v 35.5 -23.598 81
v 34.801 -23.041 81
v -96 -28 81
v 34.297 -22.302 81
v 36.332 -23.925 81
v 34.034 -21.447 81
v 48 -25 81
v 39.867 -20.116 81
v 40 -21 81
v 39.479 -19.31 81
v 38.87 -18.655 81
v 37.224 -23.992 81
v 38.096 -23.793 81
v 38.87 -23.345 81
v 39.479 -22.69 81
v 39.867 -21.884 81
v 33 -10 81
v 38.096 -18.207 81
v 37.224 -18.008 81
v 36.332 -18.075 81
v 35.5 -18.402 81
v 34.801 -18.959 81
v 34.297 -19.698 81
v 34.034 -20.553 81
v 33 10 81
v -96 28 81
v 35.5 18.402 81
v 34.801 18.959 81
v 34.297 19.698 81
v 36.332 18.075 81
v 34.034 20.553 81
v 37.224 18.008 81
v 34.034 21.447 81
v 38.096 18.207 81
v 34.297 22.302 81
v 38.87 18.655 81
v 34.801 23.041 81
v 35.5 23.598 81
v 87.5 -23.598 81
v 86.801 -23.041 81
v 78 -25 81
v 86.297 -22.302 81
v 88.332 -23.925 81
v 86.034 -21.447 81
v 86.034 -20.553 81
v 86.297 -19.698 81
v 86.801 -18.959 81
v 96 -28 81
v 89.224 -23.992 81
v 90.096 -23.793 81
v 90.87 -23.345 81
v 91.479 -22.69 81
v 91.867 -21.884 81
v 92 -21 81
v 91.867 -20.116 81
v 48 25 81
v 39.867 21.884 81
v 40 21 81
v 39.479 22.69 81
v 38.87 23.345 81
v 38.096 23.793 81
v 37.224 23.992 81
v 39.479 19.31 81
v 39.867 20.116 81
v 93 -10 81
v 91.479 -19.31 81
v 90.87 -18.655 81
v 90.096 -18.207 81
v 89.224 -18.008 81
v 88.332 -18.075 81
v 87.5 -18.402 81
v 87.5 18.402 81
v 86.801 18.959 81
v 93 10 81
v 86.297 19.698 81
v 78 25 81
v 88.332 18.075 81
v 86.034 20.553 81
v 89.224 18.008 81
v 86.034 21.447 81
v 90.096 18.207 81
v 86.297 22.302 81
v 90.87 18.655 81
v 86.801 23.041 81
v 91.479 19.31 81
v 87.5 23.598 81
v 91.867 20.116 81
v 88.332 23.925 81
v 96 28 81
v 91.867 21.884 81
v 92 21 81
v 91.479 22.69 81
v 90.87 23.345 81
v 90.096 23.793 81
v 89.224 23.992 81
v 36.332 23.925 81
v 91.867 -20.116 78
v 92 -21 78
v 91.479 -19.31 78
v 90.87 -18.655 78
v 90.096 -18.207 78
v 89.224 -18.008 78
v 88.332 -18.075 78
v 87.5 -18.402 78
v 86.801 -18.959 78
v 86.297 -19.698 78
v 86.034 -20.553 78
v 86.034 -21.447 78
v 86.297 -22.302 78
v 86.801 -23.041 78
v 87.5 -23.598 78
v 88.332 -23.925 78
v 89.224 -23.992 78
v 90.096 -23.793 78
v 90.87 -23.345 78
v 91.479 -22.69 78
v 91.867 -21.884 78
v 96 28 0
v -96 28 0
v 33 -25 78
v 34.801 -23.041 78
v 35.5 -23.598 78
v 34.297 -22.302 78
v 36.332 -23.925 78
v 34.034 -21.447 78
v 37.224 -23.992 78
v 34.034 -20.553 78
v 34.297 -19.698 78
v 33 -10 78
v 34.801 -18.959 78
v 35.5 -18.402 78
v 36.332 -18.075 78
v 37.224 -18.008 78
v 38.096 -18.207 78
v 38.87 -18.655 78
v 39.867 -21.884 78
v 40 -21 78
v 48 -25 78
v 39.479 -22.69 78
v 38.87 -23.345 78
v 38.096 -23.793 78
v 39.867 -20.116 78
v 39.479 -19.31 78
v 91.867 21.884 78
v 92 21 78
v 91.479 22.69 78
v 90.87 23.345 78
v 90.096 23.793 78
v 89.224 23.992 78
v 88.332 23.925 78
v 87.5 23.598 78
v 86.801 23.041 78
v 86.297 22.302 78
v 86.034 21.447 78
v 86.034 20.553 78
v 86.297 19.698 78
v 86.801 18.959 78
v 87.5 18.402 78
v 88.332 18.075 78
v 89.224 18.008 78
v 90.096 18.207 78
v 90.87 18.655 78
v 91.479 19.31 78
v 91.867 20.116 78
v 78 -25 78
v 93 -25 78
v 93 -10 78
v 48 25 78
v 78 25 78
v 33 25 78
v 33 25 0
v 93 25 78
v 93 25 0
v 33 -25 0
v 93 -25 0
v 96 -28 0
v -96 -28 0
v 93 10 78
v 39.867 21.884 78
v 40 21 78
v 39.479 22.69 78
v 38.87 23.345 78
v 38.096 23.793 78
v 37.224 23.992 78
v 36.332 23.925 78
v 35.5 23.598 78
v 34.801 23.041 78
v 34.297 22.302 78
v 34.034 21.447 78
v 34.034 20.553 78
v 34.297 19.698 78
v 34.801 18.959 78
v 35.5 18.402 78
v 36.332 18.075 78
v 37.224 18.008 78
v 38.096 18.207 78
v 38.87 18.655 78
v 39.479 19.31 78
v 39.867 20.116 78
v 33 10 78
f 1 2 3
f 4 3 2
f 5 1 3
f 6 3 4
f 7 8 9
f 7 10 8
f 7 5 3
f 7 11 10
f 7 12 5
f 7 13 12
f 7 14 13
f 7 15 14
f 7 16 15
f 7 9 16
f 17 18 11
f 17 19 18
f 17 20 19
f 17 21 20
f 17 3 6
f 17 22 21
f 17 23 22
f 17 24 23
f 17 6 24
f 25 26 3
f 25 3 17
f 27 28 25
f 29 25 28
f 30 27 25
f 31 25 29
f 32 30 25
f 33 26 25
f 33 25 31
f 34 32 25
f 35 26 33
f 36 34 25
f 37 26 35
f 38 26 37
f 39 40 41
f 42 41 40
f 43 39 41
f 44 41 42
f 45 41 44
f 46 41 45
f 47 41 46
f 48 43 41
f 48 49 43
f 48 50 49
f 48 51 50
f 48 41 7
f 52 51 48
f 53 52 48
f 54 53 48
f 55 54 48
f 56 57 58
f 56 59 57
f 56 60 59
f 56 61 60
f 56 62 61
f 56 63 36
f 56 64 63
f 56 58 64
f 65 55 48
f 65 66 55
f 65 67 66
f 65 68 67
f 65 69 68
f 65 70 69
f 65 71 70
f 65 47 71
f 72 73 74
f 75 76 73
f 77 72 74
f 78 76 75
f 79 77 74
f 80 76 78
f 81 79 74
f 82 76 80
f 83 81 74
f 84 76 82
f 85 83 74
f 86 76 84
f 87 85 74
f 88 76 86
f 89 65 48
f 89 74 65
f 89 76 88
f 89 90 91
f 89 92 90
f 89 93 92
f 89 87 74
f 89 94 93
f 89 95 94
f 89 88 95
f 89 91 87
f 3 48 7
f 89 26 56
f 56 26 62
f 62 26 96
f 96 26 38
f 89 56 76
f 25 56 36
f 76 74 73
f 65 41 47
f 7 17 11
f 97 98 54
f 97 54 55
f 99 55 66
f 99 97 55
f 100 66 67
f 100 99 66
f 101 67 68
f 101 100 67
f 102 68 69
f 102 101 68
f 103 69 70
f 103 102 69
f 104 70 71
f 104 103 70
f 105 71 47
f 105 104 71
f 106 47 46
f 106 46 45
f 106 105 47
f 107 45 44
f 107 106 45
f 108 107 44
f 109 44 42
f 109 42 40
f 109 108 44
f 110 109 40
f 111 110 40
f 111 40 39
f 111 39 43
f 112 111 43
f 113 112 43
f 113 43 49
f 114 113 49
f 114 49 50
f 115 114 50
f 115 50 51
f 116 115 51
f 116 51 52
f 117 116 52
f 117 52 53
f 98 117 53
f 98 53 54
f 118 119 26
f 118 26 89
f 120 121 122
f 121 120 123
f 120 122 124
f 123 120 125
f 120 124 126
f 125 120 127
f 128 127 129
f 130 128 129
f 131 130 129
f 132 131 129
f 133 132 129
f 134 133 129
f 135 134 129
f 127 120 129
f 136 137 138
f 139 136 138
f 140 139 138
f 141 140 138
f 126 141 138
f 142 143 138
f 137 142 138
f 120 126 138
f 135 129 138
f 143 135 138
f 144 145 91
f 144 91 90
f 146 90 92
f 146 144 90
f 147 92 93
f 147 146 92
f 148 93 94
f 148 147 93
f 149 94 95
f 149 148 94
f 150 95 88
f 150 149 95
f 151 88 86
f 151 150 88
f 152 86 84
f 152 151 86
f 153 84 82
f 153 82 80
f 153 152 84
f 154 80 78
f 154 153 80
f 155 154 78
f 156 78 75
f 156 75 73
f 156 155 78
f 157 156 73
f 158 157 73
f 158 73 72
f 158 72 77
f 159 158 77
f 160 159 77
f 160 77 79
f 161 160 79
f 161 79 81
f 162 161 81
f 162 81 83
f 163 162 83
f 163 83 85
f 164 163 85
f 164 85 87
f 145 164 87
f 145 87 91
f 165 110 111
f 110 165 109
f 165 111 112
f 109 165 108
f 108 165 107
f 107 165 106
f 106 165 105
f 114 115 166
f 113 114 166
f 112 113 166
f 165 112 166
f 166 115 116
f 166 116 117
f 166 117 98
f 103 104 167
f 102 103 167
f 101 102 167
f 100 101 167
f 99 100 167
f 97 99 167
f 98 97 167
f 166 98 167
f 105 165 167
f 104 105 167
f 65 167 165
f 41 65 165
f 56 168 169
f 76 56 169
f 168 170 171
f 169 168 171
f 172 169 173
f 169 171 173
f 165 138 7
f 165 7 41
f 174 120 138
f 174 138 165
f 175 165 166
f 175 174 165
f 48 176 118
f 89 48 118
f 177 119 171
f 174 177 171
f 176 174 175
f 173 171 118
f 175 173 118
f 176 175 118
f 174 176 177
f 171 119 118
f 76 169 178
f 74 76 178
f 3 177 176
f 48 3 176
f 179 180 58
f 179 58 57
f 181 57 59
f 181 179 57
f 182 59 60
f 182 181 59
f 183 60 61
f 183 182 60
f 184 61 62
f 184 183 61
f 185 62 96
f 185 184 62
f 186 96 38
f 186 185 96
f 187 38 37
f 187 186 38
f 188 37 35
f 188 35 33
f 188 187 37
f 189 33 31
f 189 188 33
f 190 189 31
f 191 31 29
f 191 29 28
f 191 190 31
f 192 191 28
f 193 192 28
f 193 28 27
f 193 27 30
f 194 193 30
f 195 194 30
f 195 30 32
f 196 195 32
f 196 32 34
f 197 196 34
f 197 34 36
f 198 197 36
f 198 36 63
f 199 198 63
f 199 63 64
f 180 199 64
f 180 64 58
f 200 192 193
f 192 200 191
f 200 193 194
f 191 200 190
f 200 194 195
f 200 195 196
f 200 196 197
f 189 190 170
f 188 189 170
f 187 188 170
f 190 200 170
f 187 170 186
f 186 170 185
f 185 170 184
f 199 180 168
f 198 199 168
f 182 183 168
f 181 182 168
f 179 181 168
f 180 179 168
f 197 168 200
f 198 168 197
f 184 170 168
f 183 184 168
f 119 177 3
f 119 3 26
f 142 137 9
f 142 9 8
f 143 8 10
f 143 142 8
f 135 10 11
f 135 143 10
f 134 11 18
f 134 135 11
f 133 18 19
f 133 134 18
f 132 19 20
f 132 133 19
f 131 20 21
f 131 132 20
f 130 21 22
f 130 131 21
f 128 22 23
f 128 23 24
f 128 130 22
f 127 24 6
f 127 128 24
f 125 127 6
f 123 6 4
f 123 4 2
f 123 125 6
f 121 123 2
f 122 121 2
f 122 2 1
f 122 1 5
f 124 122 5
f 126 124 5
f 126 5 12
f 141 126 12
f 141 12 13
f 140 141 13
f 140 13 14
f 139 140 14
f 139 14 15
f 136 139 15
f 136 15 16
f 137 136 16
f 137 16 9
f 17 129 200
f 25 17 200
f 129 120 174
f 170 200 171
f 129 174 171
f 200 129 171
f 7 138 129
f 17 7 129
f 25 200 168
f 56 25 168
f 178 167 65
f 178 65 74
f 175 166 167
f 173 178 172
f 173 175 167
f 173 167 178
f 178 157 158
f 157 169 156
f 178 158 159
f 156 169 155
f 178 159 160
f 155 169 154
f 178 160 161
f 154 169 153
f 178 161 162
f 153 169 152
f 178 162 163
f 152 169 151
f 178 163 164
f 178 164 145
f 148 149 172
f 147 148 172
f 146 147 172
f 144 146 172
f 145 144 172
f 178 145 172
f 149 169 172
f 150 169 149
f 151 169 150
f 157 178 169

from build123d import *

# Parameters (mm, degrees)
STRUCTURESKETCH001_W      = 192
STRUCTURESKETCH001_H      = 56
MAINSTRUCTURE001_DEPTH    = 81
ZONESKETCH001_R           = 3
CENTERPOCKET001_DEPTH     = 81
ZONEFILLSKETCH001_W       = 60
ZONEFILLSKETCH001_H       = 50
CENTERFILLPOCKET001_DEPTH = 78


with BuildPart() as part:
    # StructureSketch001 → MainStructure001 (new body)
    with BuildSketch(Plane.XY):
        Rectangle(STRUCTURESKETCH001_W, STRUCTURESKETCH001_H)
    extrude(amount=MAINSTRUCTURE001_DEPTH)

    # ZoneSketch001 (on DatumPlane) → CenterPocket001 (cut)
    with BuildSketch(Plane(origin=(63, 0, 0), x_dir=(1, 0, 0), z_dir=(0, 0, 1))):
        with Locations((-26, 21)):
            Circle(ZONESKETCH001_R)
        with Locations((26, 21)):
            Circle(ZONESKETCH001_R)
        with Locations((26, -21)):
            Circle(ZONESKETCH001_R)
        with Locations((-26, -21)):
            Circle(ZONESKETCH001_R)
        Polygon((-15, 25), (15, 25), (30, 10), (30, -10), (15, -25), (-15, -25), (-30, -10), (-30, 10), align=None)
    extrude(amount=CENTERPOCKET001_DEPTH, mode=Mode.SUBTRACT)

    # ZoneFillSketch001 (on DatumPlane) → CenterFillPocket001 (cut)
    with BuildSketch(Plane(origin=(63, 0, 0), x_dir=(1, 0, 0), z_dir=(0, 0, 1))):
        Rectangle(ZONEFILLSKETCH001_W, ZONEFILLSKETCH001_H)
    extrude(amount=CENTERFILLPOCKET001_DEPTH, mode=Mode.SUBTRACT)


solid = part.part
